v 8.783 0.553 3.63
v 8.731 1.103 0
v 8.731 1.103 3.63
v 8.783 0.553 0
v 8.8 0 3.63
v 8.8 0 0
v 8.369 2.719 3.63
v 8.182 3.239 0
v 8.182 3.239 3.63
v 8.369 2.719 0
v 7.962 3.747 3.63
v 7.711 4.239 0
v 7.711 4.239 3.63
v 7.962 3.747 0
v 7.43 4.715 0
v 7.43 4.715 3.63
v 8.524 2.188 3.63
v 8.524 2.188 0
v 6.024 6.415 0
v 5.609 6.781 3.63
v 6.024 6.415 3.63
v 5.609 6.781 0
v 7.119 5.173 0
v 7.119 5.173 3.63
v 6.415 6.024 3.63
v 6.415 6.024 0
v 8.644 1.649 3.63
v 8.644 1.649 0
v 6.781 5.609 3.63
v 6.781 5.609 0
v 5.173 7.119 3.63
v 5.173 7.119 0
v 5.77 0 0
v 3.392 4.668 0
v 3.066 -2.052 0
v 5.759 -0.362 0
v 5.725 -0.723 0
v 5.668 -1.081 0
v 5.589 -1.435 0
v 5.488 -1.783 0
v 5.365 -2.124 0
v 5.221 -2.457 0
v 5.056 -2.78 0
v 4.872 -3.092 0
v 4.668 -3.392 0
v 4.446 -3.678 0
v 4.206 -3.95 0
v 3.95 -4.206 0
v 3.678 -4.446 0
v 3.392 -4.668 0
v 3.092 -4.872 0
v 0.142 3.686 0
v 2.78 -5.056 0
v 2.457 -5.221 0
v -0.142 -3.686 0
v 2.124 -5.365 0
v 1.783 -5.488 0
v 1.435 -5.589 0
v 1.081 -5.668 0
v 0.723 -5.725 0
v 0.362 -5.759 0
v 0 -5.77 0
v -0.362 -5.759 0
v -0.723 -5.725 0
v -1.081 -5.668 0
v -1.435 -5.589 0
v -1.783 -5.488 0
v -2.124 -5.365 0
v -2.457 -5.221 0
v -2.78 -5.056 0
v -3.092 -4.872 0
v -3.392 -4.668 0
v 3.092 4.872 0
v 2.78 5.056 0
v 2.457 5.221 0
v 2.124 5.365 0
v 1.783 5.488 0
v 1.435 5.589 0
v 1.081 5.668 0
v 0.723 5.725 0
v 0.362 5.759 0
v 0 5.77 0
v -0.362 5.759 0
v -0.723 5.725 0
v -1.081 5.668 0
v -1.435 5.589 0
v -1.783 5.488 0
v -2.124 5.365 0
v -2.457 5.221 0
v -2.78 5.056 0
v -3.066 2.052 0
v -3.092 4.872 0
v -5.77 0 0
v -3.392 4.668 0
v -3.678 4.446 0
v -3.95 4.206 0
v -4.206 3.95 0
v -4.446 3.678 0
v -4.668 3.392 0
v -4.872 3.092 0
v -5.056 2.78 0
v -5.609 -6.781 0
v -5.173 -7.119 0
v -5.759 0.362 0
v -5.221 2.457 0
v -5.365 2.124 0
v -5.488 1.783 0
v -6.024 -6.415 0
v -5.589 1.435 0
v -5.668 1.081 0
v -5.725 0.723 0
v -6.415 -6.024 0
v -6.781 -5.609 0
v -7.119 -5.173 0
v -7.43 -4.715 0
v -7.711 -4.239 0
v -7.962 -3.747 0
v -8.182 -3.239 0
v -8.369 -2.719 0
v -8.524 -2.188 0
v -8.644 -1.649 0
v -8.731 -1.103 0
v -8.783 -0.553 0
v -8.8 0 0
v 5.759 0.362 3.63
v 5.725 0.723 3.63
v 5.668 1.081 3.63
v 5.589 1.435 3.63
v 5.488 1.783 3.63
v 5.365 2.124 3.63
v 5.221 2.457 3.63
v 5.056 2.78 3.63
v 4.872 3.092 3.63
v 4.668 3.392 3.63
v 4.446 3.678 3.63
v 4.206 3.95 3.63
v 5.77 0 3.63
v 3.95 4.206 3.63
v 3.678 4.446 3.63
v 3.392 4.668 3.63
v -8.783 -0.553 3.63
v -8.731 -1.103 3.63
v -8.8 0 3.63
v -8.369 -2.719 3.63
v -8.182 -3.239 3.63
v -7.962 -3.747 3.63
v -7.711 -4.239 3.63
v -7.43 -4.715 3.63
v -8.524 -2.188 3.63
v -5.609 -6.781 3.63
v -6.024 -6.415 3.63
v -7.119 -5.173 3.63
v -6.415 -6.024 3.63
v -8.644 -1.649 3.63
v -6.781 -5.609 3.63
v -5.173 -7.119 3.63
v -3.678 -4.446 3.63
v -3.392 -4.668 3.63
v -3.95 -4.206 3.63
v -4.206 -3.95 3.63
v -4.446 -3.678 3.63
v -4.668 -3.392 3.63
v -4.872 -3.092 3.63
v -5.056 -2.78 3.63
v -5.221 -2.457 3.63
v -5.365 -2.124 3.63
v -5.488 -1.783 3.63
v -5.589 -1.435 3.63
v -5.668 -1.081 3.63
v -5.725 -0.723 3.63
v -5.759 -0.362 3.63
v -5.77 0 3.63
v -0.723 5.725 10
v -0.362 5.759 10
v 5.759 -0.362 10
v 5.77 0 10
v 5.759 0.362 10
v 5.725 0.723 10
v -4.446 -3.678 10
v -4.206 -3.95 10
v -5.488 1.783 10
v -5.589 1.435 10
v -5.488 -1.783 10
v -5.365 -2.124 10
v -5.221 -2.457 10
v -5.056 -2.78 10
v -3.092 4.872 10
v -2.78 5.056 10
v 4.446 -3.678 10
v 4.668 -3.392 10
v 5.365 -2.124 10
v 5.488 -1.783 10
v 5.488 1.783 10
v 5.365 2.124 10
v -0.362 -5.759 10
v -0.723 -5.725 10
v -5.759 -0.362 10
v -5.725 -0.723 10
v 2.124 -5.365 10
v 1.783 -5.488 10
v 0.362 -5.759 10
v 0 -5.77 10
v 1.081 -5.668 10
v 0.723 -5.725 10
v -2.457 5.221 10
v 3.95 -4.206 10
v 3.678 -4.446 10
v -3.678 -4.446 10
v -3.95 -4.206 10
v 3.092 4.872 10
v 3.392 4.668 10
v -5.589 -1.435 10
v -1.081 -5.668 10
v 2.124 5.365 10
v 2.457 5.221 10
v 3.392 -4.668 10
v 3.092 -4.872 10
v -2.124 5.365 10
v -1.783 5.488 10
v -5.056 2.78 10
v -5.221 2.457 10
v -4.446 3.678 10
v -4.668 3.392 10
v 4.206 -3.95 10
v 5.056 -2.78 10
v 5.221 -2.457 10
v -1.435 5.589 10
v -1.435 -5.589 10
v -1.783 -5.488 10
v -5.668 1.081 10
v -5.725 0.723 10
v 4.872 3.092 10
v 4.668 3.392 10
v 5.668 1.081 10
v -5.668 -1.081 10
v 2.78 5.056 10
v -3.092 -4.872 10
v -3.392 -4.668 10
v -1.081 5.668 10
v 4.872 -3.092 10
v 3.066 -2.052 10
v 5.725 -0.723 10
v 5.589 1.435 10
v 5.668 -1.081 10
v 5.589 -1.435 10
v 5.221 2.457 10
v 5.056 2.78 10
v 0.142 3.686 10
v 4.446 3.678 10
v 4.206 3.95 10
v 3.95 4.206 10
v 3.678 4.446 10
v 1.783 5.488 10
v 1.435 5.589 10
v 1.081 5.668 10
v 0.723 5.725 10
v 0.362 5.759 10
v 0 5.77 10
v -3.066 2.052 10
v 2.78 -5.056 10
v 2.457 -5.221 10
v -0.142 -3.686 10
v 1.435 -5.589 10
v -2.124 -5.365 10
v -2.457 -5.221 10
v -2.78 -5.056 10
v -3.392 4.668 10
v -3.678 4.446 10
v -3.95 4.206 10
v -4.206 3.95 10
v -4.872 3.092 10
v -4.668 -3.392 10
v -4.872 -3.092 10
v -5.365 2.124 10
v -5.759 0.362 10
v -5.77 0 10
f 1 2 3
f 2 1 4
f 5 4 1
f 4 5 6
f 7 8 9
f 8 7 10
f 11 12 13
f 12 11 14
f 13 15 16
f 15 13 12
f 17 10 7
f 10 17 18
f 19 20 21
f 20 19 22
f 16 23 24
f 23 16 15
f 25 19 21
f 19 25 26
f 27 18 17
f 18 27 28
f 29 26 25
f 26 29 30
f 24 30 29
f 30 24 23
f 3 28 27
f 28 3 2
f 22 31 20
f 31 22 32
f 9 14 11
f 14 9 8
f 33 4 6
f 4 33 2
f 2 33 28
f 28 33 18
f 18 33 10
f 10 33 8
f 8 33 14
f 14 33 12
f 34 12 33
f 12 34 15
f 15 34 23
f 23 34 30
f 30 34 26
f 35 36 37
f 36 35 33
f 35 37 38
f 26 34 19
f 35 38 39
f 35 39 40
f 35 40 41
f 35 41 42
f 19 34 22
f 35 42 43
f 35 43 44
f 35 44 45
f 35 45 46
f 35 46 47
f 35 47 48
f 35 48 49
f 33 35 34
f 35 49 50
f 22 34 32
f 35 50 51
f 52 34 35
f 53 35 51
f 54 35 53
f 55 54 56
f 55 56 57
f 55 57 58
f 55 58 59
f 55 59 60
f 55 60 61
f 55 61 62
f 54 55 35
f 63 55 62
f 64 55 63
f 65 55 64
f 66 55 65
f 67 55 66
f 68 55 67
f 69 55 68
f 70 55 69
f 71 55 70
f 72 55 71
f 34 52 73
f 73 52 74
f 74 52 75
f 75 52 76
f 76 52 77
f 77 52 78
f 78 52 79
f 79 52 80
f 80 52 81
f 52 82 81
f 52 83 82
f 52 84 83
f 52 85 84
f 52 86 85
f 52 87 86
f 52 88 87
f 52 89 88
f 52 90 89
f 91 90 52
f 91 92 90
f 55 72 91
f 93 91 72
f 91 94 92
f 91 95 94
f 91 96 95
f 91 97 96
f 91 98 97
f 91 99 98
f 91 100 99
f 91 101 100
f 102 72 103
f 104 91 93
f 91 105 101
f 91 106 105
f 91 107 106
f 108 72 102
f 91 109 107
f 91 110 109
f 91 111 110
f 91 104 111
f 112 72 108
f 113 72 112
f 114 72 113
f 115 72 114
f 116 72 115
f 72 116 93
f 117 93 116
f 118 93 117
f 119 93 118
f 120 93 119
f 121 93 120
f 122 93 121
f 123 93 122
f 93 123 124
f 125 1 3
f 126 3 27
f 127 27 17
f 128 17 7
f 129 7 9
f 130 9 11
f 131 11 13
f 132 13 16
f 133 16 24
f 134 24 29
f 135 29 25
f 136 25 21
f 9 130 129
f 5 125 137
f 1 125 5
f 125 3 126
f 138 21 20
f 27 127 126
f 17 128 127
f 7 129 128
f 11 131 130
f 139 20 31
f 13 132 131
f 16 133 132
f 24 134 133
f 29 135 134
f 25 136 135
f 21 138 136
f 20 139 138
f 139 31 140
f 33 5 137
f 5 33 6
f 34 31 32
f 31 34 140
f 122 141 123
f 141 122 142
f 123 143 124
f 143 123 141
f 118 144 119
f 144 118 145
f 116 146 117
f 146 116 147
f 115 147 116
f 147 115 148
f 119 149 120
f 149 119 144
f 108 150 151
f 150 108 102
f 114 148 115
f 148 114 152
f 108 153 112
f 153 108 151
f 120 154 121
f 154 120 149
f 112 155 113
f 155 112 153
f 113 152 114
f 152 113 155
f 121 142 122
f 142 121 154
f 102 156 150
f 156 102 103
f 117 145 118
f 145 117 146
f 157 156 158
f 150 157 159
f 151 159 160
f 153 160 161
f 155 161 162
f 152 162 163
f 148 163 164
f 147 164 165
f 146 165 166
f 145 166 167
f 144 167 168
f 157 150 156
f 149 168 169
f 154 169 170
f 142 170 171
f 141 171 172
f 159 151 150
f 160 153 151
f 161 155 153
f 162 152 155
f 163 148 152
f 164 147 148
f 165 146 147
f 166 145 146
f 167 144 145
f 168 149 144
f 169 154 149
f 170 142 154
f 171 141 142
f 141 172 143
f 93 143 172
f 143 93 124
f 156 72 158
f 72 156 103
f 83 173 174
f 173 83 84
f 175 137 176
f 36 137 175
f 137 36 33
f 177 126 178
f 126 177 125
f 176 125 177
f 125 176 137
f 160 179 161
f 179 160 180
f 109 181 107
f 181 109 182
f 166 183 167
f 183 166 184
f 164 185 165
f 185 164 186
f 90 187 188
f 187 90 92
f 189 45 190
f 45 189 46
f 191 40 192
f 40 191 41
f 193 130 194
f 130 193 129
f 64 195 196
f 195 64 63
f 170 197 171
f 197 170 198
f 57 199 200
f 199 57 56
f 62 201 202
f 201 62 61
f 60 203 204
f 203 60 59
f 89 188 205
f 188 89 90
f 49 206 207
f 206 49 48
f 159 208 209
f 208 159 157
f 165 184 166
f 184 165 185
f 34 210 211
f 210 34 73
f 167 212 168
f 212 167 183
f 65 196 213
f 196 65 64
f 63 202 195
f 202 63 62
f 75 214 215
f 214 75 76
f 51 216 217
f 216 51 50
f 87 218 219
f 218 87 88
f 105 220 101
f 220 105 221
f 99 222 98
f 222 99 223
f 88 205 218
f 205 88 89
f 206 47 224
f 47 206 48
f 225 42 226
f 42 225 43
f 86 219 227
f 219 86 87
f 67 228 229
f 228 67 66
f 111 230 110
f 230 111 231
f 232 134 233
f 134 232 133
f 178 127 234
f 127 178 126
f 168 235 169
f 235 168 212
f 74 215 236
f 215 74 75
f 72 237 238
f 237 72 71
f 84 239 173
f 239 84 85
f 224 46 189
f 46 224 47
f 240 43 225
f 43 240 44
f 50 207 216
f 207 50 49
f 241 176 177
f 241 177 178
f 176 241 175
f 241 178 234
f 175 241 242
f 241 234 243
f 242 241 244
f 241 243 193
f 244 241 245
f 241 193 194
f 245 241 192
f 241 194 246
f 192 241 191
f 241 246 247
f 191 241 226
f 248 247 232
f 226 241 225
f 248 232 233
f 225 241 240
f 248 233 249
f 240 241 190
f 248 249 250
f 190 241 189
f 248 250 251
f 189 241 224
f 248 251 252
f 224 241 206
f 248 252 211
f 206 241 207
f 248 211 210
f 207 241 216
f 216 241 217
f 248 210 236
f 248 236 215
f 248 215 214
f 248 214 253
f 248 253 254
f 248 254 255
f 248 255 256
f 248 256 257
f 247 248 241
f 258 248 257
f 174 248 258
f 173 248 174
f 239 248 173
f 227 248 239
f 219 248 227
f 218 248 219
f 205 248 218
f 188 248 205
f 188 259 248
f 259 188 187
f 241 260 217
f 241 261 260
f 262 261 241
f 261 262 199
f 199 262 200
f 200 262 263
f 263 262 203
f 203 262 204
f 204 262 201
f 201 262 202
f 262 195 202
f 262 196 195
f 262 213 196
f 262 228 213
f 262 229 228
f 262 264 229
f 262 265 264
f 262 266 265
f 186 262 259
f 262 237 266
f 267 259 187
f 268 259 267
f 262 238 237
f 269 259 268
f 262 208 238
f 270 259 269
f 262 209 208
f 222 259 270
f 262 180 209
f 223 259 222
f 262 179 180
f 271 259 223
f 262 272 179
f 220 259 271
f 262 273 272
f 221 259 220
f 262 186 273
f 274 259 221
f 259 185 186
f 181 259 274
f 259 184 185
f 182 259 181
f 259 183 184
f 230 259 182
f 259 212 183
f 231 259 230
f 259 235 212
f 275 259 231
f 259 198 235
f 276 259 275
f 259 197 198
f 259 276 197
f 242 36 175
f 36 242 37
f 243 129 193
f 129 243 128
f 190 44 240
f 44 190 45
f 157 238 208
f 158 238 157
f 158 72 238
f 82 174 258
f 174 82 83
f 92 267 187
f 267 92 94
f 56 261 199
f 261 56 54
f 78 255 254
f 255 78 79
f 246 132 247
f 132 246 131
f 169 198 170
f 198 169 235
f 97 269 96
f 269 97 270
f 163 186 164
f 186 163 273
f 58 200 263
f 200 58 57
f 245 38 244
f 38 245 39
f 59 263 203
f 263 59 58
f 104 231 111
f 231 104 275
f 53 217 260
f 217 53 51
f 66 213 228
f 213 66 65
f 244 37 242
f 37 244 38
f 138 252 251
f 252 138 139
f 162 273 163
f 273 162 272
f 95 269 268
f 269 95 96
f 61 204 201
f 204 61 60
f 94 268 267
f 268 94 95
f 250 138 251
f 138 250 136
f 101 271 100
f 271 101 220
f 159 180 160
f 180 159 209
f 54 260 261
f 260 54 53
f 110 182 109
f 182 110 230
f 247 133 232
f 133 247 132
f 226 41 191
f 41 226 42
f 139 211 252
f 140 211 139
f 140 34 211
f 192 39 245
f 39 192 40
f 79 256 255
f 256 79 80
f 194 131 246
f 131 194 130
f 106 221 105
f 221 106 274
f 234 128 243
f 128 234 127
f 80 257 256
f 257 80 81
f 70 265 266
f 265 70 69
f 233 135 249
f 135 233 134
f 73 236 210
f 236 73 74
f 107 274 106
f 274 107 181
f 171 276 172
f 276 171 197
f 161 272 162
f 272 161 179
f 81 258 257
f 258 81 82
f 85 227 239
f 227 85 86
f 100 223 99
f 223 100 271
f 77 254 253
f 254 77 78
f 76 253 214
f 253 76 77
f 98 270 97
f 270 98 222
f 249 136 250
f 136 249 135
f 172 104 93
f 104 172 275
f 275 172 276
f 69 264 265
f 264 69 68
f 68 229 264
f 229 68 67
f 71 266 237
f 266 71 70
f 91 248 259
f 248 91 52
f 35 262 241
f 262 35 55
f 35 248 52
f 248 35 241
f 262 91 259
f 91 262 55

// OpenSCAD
$fa = .1;
$fn = 100;

//Heigth of the main cylinder
Heigth = 10.0;
//Radius of the main cylinder
RadiusCylinder = 11.54/2;
//Radius of the Pie part
RadiusPie = 17.6/2;
//heigth of the Pie part
HeigthPie = 3.63;
//Width if the Pie piece in degrees
PiePieceWidth = 54;
//Width of the hole in the main cylinder
widthHole = 3.6;
//Length of the hole in the main cylinder
lengthHole = 6.44; 

module pie_slice(r, a, h, q=90){
  intersection(){
    cylinder(h=h, r=r);
    cube([r, r, h]);
    rotate(a-q) cube([r, r, h]);
  }
}

module ding(){
	cylinder(h = Heigth, r = RadiusCylinder);
	pie_slice(r=RadiusPie,a=PiePieceWidth,h=HeigthPie);
	rotate(180) pie_slice(r=RadiusPie,a=PiePieceWidth,h=HeigthPie);
}

difference(){
	ding();
	rotate(90 + PiePieceWidth/2) cube([lengthHole, widthHole, Heigth*2+0.1], center=true);
}

